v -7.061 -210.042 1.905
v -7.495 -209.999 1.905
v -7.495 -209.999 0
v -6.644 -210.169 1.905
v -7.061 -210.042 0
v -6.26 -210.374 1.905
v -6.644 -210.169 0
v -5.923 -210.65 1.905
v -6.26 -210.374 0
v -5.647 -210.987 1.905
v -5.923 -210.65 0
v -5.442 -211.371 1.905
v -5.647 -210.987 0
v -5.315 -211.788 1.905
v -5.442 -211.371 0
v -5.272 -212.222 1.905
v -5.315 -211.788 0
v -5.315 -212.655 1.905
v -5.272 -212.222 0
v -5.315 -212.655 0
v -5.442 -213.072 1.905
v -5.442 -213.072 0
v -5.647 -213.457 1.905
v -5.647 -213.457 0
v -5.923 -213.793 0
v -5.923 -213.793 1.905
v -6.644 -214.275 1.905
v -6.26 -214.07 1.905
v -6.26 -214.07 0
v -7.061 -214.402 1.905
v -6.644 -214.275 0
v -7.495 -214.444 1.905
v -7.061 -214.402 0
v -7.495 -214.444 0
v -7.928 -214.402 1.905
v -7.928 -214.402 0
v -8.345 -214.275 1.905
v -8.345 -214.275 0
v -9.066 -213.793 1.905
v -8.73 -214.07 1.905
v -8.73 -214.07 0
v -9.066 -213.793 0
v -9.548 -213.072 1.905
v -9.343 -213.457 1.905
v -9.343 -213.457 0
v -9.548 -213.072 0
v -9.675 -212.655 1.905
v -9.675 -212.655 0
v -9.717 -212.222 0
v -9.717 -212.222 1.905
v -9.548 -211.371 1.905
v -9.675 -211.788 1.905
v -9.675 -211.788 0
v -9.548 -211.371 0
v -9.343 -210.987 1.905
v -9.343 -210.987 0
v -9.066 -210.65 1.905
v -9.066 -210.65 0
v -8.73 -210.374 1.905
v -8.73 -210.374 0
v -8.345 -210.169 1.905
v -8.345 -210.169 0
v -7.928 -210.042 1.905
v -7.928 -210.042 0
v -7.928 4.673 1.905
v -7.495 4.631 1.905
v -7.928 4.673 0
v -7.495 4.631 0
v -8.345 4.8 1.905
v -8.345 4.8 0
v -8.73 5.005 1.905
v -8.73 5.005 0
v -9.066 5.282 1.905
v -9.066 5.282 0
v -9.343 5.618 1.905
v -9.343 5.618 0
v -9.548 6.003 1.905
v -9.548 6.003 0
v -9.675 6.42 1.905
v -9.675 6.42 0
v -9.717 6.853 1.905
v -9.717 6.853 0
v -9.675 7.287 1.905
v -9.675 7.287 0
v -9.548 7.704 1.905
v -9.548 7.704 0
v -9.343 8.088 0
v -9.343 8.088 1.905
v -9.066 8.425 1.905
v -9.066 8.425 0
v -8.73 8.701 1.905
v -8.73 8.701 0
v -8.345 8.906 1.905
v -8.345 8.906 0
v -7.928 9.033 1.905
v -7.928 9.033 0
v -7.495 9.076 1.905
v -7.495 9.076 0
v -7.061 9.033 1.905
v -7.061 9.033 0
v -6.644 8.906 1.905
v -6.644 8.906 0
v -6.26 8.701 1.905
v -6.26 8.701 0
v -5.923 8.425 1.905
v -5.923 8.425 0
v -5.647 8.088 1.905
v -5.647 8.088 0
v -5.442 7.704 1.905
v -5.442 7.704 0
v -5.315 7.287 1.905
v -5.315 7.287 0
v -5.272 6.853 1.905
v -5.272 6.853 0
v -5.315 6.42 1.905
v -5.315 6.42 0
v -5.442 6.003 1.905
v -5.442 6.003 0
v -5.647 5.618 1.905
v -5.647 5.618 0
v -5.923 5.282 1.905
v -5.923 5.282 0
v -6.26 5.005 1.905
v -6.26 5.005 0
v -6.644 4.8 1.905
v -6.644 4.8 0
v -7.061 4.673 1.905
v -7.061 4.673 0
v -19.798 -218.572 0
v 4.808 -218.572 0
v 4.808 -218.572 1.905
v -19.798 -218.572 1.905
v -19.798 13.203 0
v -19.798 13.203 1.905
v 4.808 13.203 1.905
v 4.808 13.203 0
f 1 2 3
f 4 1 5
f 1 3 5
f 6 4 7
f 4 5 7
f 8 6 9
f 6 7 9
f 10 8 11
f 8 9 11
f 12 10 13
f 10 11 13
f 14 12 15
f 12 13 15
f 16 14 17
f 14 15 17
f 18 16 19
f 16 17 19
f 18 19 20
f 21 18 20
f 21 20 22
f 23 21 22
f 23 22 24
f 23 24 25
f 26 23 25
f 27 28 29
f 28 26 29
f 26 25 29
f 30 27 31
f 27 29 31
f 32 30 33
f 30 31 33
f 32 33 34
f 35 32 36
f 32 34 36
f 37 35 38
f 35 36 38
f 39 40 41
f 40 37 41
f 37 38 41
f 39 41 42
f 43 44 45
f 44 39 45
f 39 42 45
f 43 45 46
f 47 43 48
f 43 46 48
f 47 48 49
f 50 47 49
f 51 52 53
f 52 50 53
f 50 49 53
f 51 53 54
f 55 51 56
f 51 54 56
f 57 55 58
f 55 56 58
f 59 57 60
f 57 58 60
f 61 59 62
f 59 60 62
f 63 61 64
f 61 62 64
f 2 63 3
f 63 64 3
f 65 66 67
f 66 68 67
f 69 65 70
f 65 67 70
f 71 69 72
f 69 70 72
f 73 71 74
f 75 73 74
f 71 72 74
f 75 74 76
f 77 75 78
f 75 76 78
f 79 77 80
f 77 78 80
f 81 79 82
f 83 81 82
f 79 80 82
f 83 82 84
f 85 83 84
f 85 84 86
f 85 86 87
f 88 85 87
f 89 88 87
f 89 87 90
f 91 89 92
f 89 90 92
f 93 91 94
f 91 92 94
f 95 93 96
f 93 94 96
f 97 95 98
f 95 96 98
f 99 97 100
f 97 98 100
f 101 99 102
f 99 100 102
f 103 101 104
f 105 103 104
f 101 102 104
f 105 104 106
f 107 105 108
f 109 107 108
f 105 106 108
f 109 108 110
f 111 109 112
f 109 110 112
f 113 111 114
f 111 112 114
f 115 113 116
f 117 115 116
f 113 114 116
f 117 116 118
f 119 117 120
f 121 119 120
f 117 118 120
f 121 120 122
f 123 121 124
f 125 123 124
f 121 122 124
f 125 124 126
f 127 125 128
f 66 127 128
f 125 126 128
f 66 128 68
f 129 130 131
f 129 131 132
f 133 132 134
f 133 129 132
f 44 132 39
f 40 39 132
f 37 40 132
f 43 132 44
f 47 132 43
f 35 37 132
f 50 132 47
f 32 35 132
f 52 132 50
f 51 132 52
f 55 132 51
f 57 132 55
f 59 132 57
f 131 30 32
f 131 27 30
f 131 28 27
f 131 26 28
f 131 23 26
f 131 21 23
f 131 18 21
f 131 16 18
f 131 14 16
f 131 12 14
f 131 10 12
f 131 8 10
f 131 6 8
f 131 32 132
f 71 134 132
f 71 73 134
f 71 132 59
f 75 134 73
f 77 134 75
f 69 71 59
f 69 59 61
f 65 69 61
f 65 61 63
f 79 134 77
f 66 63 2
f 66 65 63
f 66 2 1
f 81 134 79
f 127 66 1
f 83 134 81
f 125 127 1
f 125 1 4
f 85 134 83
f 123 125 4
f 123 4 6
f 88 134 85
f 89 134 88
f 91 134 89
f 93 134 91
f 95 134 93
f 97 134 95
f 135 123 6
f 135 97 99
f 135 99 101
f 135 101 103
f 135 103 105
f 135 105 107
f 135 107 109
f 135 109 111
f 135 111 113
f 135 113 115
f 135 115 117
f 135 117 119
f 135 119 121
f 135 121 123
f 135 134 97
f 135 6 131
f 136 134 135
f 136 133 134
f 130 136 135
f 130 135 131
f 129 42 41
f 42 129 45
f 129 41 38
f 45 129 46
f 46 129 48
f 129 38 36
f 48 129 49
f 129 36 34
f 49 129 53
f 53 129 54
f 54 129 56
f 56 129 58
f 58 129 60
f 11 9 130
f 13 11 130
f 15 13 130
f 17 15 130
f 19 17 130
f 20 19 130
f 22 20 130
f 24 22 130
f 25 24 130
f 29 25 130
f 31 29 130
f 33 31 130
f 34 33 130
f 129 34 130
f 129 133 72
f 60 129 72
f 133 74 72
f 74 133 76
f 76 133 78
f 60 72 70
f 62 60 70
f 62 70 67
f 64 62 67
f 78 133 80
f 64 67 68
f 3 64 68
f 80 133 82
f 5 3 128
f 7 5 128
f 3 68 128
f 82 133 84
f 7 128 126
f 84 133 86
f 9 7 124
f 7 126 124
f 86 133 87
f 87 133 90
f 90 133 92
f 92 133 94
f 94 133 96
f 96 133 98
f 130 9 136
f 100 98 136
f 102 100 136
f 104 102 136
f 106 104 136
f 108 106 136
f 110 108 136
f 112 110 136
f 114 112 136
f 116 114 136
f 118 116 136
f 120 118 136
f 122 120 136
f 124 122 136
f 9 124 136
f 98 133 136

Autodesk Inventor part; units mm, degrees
ref_plane "YZ Plane" through (0, 0, 0) normal (1, 0, 0) x (0, 1, 0)
ref_plane "XZ Plane" through (0, 0, 0) normal (0, 1, 0) x (-1, 0, 0)
sketch "Sketch1" plane through (0, 0, 0) normal (0, 0, 1) x (1, 0, 0)
  line L0 (-19.7981, 13.2031) -> (4.8082, 13.2031)
  line L1 (4.8082, 13.2031) -> (4.8082, -218.5719)
  line L2 (4.8082, -218.5719) -> (-19.7981, -218.5719)
  line L3 (-19.7981, -218.5719) -> (-19.7981, 13.2031)
  point P0 (0, 0)
  dimension "d0" = 231.775
  dimension "d1" = 24.6062
extrude "Extrusion1" add sketch "Sketch1" along normal blind 1.905
sketch "Sketch2" plane through (0, 0, 1.905) normal (0, 0, 1) x (1, 0, 0)
  line L0 (4.8082, 13.2031) -> (-19.7981, 13.2031) projected
  line L1 (-7.4949, 13.2031) -> (-7.4949, -18.5655)
  line L2 (-19.7981, 13.2031) -> (-19.7981, -218.5719) projected
  line L3 (4.8082, -218.5719) -> (4.8082, 13.2031) projected
  line L4 (-19.7981, 6.8531) -> (4.8082, 6.8531)
  point P0 (0, 0)
  point P1 (-7.4949, 6.8531)
  point P2 (-7.4949, 6.8531)
  point P3 (-7.4949, 6.8531)
  dimension "d4" = 12.3031
  dimension "d6" = 6.35
hole "Hole1" at (-7.4949, 6.8531, 1.905) direction (0, 0, -1) diameter 4.445 end through all
sketch "Sketch3" plane through (0, 0, 1.905) normal (0, 0, 1) x (1, 0, 0)
  line L0 (4.8082, 13.2031) -> (4.8082, -218.5719) projected
  line L1 (4.8082, -102.6844) -> (-19.7981, -102.6844)
  line L2 (-19.7981, -218.5719) -> (-19.7981, 13.2031) projected
  line L3 (4.8082, 13.2031) -> (-19.7981, 13.2031) projected
  line L4 (4.8082, -218.5719) -> (4.8082, 13.2031) projected
  point P0 (0, 0)
  dimension "d14" = 231.775
  dimension "d15" = 115.8875
ref_plane "Work Plane1" through (-19.7981, -102.6844, 0) normal (0, 1, 0) x (1, 0, 0)
mirror "Mirror1" about plane through (-19.7981, -102.6844, 0) normal (0, 1, 0) of "Hole1"
equation "\"d15\" = 0.5 * d14"
properties part number "Rotation Resistor-01"
